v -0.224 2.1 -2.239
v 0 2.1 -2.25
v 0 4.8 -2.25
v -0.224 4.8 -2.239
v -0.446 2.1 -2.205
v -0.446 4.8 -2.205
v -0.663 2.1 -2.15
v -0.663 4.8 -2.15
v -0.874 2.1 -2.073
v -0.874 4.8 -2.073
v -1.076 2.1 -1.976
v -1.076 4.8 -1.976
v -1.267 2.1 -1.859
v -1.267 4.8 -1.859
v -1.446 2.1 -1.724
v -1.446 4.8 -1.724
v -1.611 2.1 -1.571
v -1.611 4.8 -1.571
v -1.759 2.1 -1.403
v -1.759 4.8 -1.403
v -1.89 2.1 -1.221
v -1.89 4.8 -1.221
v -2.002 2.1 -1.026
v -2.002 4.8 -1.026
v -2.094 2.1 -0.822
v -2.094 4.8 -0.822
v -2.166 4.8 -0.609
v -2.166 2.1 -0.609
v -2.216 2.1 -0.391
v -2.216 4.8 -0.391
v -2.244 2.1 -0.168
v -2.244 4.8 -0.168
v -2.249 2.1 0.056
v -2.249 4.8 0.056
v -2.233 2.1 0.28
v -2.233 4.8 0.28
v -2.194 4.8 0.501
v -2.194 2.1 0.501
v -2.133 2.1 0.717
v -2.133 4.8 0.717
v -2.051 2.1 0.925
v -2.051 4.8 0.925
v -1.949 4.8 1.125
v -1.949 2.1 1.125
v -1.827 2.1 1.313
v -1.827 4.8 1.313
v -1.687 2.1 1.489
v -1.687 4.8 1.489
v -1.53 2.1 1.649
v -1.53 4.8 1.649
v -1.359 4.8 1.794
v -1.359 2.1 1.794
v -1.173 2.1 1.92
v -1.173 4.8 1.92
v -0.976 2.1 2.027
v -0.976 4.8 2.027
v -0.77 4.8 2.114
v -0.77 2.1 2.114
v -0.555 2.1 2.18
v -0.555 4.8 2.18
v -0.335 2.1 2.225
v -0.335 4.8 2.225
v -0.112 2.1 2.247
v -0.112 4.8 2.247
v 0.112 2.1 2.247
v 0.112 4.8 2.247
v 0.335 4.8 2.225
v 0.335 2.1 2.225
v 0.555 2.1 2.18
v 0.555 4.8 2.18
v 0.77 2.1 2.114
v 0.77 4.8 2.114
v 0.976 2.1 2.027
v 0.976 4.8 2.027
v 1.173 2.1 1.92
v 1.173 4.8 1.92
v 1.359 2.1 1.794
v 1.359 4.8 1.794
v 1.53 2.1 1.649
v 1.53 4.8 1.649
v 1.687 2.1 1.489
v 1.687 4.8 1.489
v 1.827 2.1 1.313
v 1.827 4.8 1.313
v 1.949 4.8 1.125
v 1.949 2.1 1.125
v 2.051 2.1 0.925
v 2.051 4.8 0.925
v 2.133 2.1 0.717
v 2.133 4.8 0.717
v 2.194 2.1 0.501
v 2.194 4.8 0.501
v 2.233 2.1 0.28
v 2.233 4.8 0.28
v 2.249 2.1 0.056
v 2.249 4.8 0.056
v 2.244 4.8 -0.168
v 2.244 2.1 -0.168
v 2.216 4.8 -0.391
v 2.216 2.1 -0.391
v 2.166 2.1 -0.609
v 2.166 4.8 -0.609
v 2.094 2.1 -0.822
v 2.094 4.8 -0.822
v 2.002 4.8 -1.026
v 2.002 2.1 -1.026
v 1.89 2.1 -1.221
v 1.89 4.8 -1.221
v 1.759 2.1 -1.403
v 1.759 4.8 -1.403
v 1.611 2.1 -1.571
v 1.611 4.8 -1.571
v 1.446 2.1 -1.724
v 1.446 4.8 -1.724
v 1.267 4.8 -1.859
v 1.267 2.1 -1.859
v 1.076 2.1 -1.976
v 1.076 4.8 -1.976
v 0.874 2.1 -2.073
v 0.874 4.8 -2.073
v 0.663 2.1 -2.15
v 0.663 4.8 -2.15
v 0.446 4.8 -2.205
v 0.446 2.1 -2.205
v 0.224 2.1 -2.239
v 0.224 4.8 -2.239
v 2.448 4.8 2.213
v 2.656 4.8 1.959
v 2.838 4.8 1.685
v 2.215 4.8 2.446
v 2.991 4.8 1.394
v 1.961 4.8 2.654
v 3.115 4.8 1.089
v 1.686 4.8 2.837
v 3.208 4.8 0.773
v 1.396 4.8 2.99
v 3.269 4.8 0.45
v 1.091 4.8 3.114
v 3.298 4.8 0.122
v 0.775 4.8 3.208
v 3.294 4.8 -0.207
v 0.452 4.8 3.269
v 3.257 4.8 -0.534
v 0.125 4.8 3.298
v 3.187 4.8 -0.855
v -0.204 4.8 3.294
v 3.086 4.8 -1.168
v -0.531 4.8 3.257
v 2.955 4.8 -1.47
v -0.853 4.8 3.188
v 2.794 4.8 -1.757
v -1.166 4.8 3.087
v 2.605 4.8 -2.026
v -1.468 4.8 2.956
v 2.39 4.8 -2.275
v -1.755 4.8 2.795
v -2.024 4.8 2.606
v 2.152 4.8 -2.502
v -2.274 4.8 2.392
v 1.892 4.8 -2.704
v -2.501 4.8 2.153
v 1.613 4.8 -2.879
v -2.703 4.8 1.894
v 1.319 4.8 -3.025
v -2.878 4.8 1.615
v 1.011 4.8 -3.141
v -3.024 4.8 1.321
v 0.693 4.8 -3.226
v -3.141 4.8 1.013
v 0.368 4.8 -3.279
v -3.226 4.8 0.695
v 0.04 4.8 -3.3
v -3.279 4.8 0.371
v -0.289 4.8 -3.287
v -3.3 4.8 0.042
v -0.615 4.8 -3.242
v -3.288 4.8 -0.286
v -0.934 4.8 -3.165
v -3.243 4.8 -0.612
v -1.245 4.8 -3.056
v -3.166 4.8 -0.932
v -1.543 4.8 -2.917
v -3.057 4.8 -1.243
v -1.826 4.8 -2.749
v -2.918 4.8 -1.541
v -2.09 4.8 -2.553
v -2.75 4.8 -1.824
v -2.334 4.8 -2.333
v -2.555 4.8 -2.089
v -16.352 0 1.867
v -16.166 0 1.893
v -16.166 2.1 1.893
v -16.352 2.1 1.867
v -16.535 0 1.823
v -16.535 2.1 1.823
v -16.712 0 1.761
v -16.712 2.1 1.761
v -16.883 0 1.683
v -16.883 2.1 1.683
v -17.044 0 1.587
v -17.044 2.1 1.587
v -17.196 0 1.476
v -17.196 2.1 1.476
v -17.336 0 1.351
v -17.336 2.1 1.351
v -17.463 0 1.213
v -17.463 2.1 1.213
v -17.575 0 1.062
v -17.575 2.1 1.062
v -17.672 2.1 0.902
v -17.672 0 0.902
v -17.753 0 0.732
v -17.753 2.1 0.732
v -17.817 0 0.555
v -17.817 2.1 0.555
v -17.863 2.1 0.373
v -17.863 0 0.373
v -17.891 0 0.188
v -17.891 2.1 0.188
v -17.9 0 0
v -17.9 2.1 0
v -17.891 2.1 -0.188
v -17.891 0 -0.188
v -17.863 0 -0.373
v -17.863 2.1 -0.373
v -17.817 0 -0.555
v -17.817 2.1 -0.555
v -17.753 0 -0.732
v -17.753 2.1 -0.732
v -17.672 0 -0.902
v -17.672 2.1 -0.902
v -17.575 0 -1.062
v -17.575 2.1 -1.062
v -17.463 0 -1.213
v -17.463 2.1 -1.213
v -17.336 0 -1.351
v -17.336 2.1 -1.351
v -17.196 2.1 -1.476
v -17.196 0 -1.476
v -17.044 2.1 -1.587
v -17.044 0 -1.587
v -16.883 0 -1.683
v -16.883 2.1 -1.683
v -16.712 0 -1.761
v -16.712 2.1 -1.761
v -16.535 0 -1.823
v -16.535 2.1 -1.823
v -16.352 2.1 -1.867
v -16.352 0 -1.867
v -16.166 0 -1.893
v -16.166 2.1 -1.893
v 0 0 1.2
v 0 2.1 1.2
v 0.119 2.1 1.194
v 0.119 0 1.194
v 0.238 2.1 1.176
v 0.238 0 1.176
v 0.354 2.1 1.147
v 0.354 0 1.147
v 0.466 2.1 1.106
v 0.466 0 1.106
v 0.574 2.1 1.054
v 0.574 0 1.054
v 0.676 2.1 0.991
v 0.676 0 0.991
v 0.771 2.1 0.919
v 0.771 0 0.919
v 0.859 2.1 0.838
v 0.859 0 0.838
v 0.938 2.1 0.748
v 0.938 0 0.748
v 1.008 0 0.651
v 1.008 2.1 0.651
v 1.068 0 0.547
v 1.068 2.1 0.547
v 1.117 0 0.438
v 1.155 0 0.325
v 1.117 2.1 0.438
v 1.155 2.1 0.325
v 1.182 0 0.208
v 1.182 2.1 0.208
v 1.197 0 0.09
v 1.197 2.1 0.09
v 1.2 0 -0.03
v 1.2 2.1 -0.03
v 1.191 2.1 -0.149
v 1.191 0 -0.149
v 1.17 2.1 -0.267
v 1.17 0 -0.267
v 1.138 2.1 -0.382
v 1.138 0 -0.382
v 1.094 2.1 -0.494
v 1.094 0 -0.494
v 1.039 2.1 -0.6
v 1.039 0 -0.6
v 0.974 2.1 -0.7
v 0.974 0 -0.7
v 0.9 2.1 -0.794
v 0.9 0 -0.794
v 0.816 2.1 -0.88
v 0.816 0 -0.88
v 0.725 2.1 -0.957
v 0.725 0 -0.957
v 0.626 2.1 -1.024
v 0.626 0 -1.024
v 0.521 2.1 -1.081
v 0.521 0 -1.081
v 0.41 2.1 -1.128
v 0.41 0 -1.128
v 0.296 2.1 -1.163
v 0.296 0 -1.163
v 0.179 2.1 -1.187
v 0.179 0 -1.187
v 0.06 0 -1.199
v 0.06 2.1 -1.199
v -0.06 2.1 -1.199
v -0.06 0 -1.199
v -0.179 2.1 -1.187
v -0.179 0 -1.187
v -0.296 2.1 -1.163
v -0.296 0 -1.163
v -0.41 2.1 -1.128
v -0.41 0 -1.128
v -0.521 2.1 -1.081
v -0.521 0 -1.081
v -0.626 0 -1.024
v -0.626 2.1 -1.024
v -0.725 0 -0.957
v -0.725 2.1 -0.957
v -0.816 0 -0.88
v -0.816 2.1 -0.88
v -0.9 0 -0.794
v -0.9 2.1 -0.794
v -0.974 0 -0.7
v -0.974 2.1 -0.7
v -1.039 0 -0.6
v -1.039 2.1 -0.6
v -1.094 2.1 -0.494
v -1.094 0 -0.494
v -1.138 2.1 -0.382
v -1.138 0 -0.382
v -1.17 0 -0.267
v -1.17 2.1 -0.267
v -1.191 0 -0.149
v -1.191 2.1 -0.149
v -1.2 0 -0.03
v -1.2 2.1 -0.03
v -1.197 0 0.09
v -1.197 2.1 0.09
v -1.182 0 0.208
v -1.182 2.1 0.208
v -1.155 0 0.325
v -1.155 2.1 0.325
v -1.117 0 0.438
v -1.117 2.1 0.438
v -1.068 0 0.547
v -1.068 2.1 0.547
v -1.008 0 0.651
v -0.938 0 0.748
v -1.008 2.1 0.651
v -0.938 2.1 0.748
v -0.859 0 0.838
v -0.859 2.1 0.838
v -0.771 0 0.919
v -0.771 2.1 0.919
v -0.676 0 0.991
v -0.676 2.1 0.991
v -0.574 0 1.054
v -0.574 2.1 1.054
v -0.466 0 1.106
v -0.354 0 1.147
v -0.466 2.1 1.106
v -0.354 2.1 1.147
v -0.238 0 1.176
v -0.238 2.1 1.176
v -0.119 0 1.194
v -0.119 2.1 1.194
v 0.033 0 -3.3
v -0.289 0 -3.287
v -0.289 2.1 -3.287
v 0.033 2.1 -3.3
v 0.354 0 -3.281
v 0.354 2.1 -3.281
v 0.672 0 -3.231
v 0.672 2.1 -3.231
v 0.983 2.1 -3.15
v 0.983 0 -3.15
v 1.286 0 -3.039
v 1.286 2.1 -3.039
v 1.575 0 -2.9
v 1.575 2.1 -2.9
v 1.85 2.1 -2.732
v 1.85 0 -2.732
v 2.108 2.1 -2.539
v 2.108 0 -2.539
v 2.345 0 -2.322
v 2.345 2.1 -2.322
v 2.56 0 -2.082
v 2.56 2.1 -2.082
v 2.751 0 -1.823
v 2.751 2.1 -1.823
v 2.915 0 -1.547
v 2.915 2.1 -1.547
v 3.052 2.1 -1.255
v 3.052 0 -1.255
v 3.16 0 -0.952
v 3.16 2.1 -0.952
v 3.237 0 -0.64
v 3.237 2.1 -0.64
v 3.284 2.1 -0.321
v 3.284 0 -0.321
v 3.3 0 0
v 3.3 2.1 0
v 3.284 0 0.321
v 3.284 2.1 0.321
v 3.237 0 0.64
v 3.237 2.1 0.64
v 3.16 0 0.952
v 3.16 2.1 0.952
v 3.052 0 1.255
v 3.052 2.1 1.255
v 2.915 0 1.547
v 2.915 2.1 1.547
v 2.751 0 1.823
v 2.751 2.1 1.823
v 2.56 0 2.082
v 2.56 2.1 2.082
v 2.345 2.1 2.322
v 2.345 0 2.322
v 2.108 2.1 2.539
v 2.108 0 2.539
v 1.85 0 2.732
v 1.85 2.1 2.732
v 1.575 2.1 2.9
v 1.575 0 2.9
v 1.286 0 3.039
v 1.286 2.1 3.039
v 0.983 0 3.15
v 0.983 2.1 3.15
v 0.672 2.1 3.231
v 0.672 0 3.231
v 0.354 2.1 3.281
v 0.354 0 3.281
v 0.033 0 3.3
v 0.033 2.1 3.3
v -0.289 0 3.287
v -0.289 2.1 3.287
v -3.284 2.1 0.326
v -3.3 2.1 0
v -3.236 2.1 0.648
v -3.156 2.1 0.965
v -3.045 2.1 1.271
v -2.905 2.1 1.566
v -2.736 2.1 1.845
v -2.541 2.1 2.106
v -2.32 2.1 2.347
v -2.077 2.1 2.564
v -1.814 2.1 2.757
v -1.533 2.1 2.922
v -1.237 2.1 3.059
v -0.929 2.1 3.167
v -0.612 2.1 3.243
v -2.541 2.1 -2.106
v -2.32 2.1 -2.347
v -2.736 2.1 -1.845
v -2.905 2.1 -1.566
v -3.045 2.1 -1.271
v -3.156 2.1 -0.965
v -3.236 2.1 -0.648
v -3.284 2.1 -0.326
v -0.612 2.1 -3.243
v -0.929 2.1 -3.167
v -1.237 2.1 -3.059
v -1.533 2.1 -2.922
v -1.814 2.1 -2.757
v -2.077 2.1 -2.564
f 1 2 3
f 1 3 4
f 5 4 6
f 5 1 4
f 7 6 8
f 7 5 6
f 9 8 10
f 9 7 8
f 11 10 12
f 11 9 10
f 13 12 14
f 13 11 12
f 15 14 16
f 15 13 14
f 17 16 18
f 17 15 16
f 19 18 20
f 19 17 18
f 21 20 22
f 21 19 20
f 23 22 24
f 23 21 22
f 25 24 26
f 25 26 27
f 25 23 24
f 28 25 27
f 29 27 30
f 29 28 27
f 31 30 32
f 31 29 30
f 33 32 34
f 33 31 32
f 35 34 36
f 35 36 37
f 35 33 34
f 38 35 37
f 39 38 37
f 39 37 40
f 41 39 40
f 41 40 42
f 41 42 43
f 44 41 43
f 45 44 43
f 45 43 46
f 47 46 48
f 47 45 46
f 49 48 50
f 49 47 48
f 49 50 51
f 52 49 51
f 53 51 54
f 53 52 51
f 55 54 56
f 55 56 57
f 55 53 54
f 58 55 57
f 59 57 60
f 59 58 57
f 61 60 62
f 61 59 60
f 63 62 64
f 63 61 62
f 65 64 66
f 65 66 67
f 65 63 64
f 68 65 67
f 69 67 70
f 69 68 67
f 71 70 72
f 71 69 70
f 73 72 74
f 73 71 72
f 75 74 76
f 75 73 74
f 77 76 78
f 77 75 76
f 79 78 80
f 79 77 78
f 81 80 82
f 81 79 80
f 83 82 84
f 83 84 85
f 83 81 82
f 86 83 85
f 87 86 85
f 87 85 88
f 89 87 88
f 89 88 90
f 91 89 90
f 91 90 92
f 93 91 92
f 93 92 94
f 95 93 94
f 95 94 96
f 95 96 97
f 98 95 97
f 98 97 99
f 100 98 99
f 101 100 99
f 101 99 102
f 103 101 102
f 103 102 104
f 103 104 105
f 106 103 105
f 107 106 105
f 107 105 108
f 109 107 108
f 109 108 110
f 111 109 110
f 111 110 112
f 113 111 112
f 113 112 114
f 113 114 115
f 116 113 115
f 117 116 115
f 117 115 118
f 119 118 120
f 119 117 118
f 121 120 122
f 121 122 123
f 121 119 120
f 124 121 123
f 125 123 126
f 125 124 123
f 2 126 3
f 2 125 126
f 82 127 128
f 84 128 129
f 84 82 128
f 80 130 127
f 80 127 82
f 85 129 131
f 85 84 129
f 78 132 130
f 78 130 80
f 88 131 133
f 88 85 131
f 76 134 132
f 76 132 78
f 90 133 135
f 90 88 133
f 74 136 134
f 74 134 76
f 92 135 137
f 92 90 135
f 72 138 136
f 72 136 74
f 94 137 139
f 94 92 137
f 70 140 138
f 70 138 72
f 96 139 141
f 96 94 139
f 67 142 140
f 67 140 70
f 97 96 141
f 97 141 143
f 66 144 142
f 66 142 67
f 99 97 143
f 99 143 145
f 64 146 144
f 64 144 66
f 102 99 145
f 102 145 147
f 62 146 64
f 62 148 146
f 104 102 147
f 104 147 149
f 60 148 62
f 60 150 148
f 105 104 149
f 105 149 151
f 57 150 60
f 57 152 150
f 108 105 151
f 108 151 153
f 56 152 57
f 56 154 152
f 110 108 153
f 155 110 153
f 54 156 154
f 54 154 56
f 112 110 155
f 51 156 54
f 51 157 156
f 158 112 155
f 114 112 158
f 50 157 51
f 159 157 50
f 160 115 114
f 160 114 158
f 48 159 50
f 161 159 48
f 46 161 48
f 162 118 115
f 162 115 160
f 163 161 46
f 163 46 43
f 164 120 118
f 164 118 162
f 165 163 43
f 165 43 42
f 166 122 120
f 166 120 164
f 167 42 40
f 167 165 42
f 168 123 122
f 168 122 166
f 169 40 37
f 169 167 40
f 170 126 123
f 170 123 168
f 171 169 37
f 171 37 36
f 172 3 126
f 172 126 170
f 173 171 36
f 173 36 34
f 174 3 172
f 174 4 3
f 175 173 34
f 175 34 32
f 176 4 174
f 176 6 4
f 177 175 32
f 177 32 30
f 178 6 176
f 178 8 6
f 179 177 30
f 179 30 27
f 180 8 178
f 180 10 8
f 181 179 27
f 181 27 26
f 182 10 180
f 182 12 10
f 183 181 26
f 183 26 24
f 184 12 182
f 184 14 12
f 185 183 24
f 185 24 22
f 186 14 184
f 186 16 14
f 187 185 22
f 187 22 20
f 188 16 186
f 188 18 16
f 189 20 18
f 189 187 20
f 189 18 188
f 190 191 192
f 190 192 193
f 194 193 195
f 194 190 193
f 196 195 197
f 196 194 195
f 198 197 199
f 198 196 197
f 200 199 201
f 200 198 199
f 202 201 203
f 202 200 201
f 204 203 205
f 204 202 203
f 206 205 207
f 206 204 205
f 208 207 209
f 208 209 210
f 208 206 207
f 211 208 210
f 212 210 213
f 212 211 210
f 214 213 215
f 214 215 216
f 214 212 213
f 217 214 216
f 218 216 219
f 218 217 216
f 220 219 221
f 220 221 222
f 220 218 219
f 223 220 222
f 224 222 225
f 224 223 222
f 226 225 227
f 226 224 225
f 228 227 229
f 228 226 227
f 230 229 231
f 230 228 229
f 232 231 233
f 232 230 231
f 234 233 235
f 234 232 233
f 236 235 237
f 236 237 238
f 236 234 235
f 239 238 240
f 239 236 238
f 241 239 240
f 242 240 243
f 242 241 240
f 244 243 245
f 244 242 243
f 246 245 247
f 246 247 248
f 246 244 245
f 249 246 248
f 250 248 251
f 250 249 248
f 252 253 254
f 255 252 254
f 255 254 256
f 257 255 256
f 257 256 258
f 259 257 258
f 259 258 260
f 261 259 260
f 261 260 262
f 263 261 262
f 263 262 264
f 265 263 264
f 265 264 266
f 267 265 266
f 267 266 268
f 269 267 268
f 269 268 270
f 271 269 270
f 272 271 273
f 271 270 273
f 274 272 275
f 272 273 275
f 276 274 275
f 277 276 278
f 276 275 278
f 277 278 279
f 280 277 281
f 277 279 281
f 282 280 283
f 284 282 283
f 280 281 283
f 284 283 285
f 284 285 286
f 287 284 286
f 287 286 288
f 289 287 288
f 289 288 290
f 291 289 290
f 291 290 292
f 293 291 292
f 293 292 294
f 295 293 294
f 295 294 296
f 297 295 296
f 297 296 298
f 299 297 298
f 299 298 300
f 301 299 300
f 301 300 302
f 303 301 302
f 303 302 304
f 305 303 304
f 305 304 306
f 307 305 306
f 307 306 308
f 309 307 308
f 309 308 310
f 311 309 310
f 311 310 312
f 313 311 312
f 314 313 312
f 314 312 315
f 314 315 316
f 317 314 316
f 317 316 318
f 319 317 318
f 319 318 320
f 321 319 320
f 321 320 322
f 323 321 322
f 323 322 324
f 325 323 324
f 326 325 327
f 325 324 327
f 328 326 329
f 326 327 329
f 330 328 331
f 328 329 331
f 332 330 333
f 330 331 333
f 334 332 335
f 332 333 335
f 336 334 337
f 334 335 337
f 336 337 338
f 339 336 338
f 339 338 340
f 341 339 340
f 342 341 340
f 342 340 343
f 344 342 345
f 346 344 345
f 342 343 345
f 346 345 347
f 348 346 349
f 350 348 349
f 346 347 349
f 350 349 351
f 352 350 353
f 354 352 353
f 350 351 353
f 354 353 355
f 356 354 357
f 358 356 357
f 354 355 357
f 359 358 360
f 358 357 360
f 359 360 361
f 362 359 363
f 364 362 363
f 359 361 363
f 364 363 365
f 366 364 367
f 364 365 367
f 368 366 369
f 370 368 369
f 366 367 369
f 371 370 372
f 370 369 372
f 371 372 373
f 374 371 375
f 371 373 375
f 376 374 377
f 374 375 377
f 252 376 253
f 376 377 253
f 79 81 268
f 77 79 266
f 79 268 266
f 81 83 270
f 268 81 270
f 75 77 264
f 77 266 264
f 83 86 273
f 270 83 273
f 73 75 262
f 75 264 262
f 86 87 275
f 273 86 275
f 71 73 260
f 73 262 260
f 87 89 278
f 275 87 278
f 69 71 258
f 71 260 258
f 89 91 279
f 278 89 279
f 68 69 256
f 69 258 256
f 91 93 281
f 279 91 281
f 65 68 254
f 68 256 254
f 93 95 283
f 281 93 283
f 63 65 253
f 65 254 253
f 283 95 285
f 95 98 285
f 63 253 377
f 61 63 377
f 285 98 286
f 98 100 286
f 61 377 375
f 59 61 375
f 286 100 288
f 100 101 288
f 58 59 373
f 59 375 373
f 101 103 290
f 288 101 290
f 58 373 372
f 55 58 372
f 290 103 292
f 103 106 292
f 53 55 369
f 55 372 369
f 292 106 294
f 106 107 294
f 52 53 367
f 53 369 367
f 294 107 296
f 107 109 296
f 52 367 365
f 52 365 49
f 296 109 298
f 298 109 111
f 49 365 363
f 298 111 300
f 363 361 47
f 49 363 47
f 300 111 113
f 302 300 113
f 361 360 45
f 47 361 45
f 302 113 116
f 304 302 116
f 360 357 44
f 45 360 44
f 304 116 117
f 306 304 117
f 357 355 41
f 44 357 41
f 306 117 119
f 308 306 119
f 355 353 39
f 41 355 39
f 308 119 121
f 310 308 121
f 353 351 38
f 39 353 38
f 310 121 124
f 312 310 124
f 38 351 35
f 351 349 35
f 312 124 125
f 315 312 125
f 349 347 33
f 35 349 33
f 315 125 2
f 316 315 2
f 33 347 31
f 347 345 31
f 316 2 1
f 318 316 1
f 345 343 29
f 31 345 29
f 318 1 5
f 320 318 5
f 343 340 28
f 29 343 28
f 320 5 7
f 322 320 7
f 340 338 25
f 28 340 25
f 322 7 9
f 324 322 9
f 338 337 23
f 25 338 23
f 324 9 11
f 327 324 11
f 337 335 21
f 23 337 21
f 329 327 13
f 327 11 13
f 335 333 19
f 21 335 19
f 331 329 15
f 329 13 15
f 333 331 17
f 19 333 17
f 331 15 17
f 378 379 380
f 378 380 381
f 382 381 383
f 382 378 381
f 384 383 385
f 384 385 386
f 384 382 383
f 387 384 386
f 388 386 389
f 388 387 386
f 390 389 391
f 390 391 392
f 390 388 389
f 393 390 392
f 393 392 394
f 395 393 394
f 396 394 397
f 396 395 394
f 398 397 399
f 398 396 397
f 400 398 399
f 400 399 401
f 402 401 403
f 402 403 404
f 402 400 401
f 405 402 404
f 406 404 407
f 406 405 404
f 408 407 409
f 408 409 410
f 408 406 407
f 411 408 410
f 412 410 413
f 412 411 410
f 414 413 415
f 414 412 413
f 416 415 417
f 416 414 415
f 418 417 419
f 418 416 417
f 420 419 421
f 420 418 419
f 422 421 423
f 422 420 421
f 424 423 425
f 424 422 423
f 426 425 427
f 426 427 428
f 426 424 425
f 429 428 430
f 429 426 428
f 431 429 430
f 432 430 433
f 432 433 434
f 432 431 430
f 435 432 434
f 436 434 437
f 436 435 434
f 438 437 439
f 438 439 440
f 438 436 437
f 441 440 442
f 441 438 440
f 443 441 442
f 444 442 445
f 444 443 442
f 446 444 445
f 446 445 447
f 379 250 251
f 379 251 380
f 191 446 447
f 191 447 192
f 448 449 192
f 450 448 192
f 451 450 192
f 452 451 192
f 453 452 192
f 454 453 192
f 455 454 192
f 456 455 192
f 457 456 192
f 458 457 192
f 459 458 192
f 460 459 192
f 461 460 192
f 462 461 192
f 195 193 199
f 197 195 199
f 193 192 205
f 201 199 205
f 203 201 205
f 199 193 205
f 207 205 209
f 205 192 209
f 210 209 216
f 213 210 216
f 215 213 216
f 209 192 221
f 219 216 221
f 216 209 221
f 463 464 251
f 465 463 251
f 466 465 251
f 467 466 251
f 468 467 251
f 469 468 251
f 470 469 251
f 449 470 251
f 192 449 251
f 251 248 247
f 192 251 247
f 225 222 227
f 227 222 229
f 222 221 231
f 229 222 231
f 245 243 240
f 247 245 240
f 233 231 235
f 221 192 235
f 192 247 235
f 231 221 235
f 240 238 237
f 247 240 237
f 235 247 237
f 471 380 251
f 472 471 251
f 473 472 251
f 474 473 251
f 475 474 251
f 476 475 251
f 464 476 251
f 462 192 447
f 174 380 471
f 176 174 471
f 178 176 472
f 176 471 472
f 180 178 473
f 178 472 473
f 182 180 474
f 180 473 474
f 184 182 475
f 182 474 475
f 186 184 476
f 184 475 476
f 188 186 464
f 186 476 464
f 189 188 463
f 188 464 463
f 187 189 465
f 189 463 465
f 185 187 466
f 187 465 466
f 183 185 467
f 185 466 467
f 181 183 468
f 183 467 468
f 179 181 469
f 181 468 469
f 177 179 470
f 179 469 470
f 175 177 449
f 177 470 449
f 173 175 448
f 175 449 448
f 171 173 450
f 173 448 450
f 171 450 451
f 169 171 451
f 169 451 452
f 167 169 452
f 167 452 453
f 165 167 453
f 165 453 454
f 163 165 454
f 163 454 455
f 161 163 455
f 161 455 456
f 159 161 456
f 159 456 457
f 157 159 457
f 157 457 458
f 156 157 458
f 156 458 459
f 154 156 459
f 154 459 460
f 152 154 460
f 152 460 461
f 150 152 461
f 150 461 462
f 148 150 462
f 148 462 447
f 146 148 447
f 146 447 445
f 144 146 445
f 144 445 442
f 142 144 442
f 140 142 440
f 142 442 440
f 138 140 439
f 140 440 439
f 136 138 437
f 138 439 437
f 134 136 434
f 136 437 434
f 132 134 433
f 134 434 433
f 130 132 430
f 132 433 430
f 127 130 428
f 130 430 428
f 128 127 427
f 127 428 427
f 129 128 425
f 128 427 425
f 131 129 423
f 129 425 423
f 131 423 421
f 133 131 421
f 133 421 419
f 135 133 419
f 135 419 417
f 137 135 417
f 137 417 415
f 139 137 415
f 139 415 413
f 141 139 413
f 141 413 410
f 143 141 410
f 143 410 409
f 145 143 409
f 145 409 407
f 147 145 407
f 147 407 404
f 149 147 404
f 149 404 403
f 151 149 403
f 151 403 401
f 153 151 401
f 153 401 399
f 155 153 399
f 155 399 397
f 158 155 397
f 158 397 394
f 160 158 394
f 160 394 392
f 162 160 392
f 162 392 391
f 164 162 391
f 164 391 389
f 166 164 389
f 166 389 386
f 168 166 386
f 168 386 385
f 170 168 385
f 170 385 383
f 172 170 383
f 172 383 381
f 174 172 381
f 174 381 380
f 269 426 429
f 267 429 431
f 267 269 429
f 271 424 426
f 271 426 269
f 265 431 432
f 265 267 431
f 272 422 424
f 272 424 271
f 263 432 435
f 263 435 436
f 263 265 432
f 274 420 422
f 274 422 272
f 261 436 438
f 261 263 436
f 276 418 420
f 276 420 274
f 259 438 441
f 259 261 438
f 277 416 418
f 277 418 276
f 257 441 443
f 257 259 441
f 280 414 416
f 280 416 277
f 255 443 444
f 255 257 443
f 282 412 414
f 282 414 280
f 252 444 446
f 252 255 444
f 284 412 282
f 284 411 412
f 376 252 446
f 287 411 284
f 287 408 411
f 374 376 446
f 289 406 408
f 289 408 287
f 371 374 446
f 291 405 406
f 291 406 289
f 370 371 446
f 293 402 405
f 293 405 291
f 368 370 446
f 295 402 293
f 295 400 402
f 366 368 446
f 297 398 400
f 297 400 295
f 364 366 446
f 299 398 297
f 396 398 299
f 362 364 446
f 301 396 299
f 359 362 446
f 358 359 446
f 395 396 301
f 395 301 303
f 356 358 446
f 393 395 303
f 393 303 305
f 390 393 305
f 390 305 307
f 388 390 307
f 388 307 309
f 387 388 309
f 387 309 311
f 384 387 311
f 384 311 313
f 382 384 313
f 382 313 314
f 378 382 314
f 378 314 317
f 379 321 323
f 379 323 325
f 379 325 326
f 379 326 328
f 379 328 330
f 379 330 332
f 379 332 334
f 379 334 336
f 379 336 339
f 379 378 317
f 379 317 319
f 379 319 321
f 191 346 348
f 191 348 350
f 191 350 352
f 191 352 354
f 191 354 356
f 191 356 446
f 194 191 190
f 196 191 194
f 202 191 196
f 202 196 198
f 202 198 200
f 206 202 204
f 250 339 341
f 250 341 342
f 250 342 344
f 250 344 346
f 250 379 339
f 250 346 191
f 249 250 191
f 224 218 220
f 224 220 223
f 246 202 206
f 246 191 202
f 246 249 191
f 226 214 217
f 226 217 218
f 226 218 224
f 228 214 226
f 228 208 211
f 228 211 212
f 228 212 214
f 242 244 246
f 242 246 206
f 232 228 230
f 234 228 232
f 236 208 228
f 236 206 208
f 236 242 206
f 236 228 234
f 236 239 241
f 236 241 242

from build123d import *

# Parameters (mm, degrees)
EXTRUDE_1_DEPTH     = 2.1
SKETCH_3_R          = 3.3
SKETCH_3_R_2        = 2.25
EXTRUDE_2_DEPTH     = 2.7
SKETCH_5_R          = 1.2
CUT_EXTRUDE_1_DEPTH = 2.7


with BuildPart() as part:
    # 草图2 → 凸台-拉伸1 (new body)
    with BuildSketch(Plane(origin=(0, 0, 0), x_dir=(1, 0, 0), z_dir=(0, 1, 0))):
        with BuildLine():
            Line((-16.16625, 1.892712587), (-0.28875, 3.287342914))
            ThreePointArc((-0.28875, 3.287342914), (3.3, 0), (-0.28875, -3.287342914))
            Line((-0.28875, -3.287342914), (-16.16625, -1.892712587))
            ThreePointArc((-16.16625, -1.892712587), (-17.9, 0), (-16.16625, 1.892712587))
        make_face()
    extrude(amount=EXTRUDE_1_DEPTH)

    # 草图3 → 凸台-拉伸2 (add)
    with BuildSketch(Plane(origin=(0, 2.1, 0), x_dir=(1, 0, 0), z_dir=(0, 1, 0))):
        with Locations(Location((0, 0, 0), (0, 0, 95.019800132))):
            Circle(SKETCH_3_R)
        with Locations(Location((0, 0, 0), (0, 0, 90))):
            Circle(SKETCH_3_R_2, mode=Mode.SUBTRACT)
    extrude(amount=EXTRUDE_2_DEPTH)

    # 草图5 → 切除-拉伸1 (cut)
    with BuildSketch(Plane(origin=(0, 2.1, 0), x_dir=(1, 0, 0), z_dir=(0, 1, 0))):
        with Locations(Location((0, 0, 0), (0, 0, 270))):
            Circle(SKETCH_5_R)
    extrude(amount=-CUT_EXTRUDE_1_DEPTH, mode=Mode.SUBTRACT)


solid = part.part
